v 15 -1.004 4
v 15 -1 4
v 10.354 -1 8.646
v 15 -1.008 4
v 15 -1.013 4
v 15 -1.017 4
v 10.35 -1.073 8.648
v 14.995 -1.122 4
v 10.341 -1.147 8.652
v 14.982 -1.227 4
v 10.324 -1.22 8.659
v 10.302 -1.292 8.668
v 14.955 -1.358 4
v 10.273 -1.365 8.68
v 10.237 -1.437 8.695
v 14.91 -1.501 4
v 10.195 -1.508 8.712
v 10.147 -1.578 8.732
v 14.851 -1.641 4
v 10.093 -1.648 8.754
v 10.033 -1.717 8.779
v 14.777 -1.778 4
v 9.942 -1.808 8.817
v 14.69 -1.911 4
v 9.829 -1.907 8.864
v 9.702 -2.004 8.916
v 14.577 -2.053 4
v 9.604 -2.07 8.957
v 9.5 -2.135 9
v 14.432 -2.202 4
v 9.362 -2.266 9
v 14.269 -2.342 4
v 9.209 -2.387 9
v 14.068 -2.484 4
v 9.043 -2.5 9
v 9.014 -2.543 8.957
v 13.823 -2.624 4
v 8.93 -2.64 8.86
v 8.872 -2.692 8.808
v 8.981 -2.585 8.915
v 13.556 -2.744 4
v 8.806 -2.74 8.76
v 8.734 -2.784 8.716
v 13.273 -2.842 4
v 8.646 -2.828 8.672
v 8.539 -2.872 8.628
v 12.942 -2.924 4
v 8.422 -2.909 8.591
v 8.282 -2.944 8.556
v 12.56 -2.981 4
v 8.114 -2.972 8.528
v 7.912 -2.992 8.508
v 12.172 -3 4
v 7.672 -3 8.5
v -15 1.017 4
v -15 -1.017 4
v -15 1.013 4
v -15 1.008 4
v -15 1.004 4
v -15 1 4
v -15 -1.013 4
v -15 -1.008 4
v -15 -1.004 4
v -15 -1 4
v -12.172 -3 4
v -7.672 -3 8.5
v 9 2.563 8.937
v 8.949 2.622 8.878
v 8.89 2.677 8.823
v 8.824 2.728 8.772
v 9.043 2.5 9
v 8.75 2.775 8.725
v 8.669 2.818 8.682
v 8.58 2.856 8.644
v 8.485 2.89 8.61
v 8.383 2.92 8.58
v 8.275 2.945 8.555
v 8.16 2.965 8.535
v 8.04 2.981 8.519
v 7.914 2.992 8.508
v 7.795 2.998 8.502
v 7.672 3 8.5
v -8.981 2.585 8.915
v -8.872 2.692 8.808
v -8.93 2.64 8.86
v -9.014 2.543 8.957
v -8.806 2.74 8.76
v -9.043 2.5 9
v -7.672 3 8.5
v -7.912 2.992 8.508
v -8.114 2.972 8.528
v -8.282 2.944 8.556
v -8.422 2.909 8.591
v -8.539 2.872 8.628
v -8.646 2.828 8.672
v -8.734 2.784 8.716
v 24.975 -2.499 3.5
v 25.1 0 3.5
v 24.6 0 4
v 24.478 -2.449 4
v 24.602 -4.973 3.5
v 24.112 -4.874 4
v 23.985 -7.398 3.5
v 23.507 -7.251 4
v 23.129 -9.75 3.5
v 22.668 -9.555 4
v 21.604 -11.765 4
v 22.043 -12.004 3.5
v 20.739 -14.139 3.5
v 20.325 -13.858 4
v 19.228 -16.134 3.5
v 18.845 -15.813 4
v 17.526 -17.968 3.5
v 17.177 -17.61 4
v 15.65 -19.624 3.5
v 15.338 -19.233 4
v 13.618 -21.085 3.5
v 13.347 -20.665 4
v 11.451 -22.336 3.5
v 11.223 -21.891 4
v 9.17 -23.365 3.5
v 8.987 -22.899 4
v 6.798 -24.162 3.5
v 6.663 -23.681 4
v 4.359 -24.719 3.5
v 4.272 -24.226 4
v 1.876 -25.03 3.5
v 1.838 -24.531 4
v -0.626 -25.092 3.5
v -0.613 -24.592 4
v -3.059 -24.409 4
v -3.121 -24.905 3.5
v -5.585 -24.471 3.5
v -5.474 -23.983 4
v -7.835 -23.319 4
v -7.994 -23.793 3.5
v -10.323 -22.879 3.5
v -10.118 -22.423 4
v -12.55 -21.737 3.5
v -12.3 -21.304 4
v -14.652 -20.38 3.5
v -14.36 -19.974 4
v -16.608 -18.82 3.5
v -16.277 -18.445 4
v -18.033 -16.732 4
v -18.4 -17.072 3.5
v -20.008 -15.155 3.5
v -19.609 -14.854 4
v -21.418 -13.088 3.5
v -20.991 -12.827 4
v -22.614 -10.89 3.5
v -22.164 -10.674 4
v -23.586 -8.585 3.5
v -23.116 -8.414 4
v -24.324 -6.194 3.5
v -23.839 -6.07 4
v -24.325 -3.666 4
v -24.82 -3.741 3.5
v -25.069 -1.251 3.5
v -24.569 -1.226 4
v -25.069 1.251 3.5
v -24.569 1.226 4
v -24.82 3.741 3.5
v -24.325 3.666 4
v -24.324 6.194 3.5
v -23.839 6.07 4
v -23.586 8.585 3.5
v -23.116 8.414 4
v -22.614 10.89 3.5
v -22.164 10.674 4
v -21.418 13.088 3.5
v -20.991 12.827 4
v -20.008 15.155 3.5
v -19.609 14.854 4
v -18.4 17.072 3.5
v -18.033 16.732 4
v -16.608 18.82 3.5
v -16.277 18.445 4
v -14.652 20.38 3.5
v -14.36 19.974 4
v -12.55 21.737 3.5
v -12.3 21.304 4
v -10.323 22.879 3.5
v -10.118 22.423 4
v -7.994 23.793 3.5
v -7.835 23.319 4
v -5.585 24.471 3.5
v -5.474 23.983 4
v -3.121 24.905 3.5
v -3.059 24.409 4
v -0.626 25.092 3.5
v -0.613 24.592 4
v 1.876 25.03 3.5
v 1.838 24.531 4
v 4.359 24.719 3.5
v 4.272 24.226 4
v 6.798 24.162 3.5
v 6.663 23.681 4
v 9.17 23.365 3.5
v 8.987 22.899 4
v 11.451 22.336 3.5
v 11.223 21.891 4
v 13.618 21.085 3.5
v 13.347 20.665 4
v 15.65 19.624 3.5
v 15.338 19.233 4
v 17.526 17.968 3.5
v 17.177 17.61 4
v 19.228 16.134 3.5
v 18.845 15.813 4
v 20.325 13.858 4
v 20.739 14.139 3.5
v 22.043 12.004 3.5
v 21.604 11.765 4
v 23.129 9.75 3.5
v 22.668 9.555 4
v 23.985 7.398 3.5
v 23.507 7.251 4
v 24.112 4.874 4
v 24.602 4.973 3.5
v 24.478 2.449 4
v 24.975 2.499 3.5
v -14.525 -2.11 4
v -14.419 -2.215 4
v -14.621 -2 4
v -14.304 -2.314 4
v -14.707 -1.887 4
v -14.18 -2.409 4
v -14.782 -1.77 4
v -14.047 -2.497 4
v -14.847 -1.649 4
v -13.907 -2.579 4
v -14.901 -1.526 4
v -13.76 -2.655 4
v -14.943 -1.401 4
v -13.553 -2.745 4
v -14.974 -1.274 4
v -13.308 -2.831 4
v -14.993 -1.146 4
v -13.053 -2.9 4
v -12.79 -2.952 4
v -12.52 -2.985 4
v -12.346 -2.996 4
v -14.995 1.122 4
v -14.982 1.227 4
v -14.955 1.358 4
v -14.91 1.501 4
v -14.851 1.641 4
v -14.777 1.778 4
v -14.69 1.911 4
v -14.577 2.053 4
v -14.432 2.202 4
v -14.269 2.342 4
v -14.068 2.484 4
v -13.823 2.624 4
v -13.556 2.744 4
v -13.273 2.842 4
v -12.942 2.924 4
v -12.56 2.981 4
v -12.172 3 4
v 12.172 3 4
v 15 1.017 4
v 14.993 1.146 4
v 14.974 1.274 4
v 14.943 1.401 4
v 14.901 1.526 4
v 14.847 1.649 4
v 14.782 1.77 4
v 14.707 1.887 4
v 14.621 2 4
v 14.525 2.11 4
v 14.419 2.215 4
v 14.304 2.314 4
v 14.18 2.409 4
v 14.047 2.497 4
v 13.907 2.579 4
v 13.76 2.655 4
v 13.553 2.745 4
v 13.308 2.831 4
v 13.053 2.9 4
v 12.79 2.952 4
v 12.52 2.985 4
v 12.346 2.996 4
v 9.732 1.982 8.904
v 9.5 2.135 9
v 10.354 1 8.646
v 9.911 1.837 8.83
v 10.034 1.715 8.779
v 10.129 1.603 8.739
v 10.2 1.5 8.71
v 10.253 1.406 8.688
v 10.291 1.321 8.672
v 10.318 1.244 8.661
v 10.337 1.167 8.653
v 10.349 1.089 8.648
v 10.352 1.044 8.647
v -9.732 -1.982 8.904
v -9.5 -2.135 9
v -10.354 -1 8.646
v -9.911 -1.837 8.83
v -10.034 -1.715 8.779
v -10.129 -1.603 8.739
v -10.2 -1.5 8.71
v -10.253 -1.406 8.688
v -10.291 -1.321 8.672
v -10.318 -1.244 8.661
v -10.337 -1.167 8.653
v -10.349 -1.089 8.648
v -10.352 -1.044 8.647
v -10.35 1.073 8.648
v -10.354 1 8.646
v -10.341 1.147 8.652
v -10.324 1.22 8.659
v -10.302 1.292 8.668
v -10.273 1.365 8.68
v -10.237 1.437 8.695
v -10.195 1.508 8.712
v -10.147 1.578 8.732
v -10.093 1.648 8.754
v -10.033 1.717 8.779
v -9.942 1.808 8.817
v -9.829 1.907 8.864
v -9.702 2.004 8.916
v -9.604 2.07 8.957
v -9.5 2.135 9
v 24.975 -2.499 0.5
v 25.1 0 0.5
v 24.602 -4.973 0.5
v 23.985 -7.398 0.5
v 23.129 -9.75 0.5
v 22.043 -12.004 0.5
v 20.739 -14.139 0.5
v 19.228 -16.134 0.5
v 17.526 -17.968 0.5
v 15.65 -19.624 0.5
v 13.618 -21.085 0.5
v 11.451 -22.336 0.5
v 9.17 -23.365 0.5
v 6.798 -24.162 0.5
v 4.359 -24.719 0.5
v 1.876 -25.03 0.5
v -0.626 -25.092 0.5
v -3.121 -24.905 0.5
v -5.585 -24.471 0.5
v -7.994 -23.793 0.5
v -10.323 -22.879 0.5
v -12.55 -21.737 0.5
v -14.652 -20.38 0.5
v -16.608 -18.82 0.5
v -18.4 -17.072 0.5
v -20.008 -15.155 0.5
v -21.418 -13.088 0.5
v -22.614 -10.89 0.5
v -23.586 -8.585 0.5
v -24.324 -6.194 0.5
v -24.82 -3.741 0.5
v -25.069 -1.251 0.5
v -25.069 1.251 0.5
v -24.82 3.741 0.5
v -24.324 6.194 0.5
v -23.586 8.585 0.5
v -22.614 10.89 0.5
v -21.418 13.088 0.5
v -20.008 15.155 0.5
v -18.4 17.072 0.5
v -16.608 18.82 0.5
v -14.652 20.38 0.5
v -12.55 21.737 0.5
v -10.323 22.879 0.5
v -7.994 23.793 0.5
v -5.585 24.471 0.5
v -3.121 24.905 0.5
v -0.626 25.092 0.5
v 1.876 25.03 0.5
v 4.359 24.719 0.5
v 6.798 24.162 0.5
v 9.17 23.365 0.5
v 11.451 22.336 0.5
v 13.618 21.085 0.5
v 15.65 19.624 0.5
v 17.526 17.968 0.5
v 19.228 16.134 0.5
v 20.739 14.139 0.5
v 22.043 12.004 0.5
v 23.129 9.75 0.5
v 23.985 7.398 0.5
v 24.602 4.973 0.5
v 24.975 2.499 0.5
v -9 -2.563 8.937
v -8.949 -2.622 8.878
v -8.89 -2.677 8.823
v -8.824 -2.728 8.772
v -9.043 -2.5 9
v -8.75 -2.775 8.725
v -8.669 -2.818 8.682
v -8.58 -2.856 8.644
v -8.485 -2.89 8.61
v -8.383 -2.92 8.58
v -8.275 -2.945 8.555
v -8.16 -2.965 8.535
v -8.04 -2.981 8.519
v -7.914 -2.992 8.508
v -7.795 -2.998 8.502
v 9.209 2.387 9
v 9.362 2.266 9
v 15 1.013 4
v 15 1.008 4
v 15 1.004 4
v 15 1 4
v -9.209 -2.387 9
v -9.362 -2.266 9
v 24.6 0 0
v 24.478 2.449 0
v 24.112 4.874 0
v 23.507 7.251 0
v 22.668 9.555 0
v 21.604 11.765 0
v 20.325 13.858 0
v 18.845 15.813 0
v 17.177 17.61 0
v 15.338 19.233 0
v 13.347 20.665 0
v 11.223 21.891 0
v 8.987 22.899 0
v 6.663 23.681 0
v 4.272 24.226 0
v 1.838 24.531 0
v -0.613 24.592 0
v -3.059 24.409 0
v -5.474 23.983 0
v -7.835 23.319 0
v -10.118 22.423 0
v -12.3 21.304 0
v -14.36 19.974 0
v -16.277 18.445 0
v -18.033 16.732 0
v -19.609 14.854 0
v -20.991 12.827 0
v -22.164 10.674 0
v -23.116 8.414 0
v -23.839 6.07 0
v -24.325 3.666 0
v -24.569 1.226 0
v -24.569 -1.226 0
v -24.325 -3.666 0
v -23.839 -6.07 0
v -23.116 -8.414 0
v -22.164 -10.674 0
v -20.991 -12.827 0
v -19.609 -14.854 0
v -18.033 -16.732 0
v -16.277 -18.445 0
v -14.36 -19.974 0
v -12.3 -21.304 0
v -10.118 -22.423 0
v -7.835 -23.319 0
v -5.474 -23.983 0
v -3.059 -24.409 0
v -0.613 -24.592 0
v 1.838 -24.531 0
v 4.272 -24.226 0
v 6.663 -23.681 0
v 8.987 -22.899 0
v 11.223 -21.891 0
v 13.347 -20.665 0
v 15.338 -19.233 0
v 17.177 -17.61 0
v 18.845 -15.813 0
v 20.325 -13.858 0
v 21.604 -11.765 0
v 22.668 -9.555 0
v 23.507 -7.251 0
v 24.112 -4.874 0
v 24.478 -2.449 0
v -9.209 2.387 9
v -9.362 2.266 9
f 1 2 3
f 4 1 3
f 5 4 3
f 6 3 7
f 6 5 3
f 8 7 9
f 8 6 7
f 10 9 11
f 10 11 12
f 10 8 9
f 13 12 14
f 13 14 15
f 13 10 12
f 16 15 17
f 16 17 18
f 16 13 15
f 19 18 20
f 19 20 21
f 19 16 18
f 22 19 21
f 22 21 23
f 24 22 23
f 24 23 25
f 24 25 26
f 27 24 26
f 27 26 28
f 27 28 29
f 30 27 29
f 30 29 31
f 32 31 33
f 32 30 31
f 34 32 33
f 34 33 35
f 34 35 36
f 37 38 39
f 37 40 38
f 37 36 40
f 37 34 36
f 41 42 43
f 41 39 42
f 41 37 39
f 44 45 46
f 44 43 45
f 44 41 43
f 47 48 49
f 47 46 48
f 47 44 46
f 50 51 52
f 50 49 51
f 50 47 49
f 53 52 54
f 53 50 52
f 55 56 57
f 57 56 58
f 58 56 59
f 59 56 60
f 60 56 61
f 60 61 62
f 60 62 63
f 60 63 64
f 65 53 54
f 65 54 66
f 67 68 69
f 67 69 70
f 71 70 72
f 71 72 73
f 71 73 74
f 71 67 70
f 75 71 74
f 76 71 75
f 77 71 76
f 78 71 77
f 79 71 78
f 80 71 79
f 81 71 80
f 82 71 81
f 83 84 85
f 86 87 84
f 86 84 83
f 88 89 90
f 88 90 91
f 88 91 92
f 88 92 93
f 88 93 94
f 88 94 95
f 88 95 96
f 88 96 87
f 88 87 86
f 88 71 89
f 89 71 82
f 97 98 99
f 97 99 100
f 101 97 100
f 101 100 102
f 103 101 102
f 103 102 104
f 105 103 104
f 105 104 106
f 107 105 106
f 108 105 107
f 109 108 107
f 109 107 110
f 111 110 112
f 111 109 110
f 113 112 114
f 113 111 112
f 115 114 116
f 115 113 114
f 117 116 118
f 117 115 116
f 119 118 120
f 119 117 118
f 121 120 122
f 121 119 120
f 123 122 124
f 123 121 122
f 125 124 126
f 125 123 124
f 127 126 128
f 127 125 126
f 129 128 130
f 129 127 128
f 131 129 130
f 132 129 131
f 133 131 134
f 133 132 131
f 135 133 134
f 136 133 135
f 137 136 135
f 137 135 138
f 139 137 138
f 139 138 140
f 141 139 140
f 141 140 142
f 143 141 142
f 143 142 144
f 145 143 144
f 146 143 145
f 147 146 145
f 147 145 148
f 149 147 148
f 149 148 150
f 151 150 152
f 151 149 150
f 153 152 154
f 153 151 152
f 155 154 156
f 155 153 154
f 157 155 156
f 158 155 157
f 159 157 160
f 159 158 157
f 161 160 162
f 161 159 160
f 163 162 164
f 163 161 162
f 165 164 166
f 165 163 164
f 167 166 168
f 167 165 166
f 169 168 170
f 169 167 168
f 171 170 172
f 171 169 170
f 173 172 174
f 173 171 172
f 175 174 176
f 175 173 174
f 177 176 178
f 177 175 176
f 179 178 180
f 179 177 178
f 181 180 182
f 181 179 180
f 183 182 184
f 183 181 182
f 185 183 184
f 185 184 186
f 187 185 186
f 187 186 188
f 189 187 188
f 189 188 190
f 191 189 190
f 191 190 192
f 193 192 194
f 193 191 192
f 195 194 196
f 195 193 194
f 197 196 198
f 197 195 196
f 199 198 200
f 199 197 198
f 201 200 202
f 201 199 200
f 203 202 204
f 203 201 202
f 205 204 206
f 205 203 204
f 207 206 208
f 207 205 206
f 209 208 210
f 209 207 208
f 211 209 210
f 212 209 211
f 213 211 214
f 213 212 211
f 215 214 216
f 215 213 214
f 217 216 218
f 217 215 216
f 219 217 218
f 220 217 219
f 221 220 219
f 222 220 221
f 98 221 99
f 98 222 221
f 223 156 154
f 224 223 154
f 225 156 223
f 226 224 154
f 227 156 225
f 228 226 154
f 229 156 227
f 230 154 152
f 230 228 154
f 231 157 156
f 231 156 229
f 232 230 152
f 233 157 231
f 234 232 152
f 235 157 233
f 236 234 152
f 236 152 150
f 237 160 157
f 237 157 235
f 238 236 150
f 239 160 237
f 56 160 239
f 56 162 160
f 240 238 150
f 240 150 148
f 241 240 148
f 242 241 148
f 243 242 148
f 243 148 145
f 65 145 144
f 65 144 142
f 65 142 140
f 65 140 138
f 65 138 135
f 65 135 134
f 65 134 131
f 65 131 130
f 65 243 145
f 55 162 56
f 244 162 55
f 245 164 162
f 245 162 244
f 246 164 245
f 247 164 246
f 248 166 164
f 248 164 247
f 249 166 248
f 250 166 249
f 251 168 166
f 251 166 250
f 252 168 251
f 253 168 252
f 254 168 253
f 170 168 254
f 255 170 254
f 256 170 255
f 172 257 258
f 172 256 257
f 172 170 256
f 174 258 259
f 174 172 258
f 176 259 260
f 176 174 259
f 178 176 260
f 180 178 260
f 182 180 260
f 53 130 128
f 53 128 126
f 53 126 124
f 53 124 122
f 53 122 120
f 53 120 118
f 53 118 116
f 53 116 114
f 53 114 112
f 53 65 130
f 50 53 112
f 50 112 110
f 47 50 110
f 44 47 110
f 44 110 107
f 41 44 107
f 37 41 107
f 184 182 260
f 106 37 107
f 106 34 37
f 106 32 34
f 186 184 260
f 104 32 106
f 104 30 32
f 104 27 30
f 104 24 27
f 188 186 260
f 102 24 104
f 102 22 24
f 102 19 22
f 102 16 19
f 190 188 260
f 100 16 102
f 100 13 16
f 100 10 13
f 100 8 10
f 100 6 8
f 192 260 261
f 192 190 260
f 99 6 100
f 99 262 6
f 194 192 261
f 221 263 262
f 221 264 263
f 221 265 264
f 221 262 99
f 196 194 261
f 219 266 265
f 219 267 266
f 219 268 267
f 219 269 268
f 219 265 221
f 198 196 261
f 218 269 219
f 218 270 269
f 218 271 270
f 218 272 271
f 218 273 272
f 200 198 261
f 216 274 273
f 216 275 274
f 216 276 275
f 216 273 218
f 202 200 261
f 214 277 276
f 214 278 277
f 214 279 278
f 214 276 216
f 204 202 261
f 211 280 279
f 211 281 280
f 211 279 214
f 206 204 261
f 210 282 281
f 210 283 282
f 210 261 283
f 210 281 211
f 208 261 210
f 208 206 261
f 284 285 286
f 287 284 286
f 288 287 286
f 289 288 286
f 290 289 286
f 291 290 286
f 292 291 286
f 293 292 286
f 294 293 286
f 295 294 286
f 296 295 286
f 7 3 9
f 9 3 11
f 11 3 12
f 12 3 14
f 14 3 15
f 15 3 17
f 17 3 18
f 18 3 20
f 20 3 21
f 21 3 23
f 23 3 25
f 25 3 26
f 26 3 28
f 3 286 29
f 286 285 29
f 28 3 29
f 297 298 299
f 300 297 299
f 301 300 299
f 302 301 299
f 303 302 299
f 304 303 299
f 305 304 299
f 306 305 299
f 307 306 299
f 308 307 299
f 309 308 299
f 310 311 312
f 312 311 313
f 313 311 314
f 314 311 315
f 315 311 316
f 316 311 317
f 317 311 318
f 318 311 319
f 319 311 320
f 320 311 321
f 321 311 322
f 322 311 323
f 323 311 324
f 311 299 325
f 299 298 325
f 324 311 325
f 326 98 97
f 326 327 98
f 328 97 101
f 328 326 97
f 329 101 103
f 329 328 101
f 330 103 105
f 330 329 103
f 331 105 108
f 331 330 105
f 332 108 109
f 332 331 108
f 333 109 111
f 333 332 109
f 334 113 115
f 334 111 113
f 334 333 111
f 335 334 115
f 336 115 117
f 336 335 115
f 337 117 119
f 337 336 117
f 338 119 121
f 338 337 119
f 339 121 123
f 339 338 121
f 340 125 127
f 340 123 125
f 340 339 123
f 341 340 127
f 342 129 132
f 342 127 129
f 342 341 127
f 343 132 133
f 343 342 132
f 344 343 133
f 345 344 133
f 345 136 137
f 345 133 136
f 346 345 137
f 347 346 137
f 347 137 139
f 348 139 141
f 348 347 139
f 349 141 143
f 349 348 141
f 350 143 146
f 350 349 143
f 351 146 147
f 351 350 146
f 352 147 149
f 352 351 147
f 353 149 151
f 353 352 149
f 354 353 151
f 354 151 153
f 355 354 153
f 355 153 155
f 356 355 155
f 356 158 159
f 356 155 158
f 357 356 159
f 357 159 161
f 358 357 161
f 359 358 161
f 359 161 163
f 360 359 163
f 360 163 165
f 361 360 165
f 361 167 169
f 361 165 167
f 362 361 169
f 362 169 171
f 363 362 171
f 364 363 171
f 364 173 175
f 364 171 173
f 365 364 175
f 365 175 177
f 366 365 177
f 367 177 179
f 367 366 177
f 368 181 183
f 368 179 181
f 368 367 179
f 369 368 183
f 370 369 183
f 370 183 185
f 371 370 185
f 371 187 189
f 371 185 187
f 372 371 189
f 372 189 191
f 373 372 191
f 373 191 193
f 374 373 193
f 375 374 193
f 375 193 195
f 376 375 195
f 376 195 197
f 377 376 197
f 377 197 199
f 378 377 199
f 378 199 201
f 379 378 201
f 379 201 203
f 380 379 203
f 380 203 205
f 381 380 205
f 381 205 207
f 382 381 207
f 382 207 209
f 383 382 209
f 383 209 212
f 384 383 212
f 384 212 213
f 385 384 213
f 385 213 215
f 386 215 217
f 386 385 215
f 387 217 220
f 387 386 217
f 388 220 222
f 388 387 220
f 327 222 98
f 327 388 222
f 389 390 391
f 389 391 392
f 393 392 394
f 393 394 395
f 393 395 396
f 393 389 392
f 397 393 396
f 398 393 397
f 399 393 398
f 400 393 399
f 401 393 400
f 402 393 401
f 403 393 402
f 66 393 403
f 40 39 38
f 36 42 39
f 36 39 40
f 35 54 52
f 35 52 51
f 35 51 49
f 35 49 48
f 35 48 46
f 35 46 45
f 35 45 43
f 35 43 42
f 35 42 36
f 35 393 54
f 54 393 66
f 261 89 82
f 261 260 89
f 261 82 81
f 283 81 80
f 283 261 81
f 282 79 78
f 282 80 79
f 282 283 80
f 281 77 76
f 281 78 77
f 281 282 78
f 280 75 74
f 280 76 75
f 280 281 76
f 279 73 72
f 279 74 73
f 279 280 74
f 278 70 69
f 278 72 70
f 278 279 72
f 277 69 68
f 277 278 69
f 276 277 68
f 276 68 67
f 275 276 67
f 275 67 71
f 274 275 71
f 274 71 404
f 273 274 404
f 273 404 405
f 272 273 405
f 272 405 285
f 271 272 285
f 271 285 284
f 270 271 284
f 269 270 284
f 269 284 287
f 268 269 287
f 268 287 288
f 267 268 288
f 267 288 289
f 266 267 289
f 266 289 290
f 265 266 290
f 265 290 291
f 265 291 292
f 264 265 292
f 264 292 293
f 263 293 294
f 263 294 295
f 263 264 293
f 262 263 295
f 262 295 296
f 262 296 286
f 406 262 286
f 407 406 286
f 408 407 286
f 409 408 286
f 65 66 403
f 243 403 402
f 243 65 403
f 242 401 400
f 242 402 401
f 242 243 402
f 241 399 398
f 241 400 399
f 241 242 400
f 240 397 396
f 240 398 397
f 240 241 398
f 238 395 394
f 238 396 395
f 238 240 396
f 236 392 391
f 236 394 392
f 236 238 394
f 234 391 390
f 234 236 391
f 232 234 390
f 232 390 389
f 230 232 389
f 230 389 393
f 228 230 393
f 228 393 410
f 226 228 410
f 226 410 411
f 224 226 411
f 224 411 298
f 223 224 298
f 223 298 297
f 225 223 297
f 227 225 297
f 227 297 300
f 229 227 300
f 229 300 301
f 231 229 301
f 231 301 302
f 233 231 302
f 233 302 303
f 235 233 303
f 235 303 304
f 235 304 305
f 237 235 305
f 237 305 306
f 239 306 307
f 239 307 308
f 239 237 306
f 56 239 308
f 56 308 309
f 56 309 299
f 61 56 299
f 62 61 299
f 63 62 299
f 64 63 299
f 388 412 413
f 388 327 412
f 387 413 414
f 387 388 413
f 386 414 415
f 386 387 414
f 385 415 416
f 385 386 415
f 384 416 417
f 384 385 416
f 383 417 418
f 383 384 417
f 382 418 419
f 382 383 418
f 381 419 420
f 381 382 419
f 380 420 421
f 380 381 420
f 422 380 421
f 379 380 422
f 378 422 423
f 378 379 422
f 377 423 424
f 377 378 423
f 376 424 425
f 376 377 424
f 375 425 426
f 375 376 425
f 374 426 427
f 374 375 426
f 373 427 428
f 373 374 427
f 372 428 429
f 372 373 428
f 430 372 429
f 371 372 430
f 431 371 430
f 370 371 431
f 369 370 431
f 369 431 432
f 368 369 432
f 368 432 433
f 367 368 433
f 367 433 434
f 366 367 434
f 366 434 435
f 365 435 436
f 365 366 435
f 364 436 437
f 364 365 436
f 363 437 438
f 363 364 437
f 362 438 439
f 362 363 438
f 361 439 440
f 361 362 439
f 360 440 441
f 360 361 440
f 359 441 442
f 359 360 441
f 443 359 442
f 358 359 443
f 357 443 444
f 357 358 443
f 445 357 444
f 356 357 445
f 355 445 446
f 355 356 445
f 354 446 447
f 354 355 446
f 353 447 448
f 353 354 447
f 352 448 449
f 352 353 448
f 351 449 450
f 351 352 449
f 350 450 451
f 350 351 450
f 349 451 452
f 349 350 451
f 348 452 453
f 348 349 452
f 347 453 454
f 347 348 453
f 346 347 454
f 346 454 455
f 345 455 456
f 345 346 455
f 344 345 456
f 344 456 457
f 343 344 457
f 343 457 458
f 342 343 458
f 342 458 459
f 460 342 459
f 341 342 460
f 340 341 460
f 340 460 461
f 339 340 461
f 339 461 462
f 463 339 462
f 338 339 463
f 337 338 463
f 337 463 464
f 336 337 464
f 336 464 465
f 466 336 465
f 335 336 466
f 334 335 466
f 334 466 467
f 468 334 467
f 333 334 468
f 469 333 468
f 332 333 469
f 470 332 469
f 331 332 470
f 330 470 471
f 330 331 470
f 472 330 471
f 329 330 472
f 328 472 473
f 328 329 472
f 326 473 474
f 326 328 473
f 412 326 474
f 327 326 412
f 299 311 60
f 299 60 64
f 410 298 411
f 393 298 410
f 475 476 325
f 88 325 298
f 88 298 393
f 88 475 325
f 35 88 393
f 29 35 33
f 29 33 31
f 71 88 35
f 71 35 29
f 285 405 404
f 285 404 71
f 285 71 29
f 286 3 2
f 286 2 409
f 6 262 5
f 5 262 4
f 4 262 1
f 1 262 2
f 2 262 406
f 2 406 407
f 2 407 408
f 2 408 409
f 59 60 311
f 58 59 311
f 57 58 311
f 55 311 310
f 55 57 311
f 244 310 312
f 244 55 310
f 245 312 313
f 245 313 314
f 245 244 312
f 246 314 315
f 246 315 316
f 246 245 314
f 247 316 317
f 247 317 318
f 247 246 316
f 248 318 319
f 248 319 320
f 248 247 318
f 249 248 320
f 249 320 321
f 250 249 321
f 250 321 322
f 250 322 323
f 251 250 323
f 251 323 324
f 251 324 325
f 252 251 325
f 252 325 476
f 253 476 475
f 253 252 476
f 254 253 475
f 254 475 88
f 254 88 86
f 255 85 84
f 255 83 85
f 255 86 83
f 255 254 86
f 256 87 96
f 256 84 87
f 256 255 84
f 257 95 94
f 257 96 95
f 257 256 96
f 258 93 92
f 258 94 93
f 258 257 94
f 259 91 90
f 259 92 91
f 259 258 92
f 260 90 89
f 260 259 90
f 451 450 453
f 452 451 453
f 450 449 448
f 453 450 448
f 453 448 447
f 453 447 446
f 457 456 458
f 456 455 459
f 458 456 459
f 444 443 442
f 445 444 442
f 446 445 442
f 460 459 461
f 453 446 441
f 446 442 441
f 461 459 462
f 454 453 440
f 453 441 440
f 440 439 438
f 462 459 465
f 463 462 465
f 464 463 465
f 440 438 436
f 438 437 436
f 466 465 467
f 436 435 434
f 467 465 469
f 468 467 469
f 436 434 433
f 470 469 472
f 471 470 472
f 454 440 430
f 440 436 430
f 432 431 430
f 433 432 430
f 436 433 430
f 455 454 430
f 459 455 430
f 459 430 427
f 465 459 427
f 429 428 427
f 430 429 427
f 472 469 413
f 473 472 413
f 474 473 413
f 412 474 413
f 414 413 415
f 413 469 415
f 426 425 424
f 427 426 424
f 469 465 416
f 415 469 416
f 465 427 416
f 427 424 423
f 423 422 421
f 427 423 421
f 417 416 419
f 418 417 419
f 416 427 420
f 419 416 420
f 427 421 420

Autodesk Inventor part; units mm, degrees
ref_plane "YZ Plane" through (0, 0, 0) normal (1, 0, 0) x (0, 1, 0)
ref_plane "XZ Plane" through (0, 0, 0) normal (0, 1, 0) x (-1, 0, 0)
ref_plane "XY Plane" through (0, 0, 0) normal (0, 0, 1) x (1, 0, 0)
sketch "Sketch1" plane through (0, 0, 0) normal (0, 0, 1) x (1, 0, 0)
  circle A0 centre (0, 0) radius 25.1
  dimension "d0" = 50.2
extrude "Extrusion1" add sketch "Sketch1" along normal blind 4
sketch "Sketch2" plane through (0, 0, 4) normal (0, 0, 1) x (1, 0, 0)
  line L0 (-15, 3) -> (15, 3)
  line L1 (15, 3) -> (15, -3)
  line L2 (15, -3) -> (-15, -3)
  line L3 (-15, -3) -> (-15, 3)
  point P0 (0, 0)
  point P1 (15, 0)
  point P2 (0, 3)
  dimension "d3" = 30
  dimension "d4" = 6
extrude "Extrusion2" add sketch "Sketch2" along normal blind 5
chamfer "Chamfer1" distance 5 angle 45 2 edges at (15, 0, 9) (-15, 0, 9)
chamfer "Chamfer2" distance 0.5 angle 45 6 edges at (0, -3, 9) (-10.0001, 0, 9) (0, 3, 9) (10.0001, 0, 9) (-25.1, 0, 4) (-25.1, 0, 0)
fillet "Fillet2" radius 2 4 edges at (-12.7501, -3, 6.25) (-12.75, 3, 6.25) (12.75, -3, 6.25) (12.7501, 3, 6.2501)
properties part number "Sensor-Cap" material "ABS Plastic"
